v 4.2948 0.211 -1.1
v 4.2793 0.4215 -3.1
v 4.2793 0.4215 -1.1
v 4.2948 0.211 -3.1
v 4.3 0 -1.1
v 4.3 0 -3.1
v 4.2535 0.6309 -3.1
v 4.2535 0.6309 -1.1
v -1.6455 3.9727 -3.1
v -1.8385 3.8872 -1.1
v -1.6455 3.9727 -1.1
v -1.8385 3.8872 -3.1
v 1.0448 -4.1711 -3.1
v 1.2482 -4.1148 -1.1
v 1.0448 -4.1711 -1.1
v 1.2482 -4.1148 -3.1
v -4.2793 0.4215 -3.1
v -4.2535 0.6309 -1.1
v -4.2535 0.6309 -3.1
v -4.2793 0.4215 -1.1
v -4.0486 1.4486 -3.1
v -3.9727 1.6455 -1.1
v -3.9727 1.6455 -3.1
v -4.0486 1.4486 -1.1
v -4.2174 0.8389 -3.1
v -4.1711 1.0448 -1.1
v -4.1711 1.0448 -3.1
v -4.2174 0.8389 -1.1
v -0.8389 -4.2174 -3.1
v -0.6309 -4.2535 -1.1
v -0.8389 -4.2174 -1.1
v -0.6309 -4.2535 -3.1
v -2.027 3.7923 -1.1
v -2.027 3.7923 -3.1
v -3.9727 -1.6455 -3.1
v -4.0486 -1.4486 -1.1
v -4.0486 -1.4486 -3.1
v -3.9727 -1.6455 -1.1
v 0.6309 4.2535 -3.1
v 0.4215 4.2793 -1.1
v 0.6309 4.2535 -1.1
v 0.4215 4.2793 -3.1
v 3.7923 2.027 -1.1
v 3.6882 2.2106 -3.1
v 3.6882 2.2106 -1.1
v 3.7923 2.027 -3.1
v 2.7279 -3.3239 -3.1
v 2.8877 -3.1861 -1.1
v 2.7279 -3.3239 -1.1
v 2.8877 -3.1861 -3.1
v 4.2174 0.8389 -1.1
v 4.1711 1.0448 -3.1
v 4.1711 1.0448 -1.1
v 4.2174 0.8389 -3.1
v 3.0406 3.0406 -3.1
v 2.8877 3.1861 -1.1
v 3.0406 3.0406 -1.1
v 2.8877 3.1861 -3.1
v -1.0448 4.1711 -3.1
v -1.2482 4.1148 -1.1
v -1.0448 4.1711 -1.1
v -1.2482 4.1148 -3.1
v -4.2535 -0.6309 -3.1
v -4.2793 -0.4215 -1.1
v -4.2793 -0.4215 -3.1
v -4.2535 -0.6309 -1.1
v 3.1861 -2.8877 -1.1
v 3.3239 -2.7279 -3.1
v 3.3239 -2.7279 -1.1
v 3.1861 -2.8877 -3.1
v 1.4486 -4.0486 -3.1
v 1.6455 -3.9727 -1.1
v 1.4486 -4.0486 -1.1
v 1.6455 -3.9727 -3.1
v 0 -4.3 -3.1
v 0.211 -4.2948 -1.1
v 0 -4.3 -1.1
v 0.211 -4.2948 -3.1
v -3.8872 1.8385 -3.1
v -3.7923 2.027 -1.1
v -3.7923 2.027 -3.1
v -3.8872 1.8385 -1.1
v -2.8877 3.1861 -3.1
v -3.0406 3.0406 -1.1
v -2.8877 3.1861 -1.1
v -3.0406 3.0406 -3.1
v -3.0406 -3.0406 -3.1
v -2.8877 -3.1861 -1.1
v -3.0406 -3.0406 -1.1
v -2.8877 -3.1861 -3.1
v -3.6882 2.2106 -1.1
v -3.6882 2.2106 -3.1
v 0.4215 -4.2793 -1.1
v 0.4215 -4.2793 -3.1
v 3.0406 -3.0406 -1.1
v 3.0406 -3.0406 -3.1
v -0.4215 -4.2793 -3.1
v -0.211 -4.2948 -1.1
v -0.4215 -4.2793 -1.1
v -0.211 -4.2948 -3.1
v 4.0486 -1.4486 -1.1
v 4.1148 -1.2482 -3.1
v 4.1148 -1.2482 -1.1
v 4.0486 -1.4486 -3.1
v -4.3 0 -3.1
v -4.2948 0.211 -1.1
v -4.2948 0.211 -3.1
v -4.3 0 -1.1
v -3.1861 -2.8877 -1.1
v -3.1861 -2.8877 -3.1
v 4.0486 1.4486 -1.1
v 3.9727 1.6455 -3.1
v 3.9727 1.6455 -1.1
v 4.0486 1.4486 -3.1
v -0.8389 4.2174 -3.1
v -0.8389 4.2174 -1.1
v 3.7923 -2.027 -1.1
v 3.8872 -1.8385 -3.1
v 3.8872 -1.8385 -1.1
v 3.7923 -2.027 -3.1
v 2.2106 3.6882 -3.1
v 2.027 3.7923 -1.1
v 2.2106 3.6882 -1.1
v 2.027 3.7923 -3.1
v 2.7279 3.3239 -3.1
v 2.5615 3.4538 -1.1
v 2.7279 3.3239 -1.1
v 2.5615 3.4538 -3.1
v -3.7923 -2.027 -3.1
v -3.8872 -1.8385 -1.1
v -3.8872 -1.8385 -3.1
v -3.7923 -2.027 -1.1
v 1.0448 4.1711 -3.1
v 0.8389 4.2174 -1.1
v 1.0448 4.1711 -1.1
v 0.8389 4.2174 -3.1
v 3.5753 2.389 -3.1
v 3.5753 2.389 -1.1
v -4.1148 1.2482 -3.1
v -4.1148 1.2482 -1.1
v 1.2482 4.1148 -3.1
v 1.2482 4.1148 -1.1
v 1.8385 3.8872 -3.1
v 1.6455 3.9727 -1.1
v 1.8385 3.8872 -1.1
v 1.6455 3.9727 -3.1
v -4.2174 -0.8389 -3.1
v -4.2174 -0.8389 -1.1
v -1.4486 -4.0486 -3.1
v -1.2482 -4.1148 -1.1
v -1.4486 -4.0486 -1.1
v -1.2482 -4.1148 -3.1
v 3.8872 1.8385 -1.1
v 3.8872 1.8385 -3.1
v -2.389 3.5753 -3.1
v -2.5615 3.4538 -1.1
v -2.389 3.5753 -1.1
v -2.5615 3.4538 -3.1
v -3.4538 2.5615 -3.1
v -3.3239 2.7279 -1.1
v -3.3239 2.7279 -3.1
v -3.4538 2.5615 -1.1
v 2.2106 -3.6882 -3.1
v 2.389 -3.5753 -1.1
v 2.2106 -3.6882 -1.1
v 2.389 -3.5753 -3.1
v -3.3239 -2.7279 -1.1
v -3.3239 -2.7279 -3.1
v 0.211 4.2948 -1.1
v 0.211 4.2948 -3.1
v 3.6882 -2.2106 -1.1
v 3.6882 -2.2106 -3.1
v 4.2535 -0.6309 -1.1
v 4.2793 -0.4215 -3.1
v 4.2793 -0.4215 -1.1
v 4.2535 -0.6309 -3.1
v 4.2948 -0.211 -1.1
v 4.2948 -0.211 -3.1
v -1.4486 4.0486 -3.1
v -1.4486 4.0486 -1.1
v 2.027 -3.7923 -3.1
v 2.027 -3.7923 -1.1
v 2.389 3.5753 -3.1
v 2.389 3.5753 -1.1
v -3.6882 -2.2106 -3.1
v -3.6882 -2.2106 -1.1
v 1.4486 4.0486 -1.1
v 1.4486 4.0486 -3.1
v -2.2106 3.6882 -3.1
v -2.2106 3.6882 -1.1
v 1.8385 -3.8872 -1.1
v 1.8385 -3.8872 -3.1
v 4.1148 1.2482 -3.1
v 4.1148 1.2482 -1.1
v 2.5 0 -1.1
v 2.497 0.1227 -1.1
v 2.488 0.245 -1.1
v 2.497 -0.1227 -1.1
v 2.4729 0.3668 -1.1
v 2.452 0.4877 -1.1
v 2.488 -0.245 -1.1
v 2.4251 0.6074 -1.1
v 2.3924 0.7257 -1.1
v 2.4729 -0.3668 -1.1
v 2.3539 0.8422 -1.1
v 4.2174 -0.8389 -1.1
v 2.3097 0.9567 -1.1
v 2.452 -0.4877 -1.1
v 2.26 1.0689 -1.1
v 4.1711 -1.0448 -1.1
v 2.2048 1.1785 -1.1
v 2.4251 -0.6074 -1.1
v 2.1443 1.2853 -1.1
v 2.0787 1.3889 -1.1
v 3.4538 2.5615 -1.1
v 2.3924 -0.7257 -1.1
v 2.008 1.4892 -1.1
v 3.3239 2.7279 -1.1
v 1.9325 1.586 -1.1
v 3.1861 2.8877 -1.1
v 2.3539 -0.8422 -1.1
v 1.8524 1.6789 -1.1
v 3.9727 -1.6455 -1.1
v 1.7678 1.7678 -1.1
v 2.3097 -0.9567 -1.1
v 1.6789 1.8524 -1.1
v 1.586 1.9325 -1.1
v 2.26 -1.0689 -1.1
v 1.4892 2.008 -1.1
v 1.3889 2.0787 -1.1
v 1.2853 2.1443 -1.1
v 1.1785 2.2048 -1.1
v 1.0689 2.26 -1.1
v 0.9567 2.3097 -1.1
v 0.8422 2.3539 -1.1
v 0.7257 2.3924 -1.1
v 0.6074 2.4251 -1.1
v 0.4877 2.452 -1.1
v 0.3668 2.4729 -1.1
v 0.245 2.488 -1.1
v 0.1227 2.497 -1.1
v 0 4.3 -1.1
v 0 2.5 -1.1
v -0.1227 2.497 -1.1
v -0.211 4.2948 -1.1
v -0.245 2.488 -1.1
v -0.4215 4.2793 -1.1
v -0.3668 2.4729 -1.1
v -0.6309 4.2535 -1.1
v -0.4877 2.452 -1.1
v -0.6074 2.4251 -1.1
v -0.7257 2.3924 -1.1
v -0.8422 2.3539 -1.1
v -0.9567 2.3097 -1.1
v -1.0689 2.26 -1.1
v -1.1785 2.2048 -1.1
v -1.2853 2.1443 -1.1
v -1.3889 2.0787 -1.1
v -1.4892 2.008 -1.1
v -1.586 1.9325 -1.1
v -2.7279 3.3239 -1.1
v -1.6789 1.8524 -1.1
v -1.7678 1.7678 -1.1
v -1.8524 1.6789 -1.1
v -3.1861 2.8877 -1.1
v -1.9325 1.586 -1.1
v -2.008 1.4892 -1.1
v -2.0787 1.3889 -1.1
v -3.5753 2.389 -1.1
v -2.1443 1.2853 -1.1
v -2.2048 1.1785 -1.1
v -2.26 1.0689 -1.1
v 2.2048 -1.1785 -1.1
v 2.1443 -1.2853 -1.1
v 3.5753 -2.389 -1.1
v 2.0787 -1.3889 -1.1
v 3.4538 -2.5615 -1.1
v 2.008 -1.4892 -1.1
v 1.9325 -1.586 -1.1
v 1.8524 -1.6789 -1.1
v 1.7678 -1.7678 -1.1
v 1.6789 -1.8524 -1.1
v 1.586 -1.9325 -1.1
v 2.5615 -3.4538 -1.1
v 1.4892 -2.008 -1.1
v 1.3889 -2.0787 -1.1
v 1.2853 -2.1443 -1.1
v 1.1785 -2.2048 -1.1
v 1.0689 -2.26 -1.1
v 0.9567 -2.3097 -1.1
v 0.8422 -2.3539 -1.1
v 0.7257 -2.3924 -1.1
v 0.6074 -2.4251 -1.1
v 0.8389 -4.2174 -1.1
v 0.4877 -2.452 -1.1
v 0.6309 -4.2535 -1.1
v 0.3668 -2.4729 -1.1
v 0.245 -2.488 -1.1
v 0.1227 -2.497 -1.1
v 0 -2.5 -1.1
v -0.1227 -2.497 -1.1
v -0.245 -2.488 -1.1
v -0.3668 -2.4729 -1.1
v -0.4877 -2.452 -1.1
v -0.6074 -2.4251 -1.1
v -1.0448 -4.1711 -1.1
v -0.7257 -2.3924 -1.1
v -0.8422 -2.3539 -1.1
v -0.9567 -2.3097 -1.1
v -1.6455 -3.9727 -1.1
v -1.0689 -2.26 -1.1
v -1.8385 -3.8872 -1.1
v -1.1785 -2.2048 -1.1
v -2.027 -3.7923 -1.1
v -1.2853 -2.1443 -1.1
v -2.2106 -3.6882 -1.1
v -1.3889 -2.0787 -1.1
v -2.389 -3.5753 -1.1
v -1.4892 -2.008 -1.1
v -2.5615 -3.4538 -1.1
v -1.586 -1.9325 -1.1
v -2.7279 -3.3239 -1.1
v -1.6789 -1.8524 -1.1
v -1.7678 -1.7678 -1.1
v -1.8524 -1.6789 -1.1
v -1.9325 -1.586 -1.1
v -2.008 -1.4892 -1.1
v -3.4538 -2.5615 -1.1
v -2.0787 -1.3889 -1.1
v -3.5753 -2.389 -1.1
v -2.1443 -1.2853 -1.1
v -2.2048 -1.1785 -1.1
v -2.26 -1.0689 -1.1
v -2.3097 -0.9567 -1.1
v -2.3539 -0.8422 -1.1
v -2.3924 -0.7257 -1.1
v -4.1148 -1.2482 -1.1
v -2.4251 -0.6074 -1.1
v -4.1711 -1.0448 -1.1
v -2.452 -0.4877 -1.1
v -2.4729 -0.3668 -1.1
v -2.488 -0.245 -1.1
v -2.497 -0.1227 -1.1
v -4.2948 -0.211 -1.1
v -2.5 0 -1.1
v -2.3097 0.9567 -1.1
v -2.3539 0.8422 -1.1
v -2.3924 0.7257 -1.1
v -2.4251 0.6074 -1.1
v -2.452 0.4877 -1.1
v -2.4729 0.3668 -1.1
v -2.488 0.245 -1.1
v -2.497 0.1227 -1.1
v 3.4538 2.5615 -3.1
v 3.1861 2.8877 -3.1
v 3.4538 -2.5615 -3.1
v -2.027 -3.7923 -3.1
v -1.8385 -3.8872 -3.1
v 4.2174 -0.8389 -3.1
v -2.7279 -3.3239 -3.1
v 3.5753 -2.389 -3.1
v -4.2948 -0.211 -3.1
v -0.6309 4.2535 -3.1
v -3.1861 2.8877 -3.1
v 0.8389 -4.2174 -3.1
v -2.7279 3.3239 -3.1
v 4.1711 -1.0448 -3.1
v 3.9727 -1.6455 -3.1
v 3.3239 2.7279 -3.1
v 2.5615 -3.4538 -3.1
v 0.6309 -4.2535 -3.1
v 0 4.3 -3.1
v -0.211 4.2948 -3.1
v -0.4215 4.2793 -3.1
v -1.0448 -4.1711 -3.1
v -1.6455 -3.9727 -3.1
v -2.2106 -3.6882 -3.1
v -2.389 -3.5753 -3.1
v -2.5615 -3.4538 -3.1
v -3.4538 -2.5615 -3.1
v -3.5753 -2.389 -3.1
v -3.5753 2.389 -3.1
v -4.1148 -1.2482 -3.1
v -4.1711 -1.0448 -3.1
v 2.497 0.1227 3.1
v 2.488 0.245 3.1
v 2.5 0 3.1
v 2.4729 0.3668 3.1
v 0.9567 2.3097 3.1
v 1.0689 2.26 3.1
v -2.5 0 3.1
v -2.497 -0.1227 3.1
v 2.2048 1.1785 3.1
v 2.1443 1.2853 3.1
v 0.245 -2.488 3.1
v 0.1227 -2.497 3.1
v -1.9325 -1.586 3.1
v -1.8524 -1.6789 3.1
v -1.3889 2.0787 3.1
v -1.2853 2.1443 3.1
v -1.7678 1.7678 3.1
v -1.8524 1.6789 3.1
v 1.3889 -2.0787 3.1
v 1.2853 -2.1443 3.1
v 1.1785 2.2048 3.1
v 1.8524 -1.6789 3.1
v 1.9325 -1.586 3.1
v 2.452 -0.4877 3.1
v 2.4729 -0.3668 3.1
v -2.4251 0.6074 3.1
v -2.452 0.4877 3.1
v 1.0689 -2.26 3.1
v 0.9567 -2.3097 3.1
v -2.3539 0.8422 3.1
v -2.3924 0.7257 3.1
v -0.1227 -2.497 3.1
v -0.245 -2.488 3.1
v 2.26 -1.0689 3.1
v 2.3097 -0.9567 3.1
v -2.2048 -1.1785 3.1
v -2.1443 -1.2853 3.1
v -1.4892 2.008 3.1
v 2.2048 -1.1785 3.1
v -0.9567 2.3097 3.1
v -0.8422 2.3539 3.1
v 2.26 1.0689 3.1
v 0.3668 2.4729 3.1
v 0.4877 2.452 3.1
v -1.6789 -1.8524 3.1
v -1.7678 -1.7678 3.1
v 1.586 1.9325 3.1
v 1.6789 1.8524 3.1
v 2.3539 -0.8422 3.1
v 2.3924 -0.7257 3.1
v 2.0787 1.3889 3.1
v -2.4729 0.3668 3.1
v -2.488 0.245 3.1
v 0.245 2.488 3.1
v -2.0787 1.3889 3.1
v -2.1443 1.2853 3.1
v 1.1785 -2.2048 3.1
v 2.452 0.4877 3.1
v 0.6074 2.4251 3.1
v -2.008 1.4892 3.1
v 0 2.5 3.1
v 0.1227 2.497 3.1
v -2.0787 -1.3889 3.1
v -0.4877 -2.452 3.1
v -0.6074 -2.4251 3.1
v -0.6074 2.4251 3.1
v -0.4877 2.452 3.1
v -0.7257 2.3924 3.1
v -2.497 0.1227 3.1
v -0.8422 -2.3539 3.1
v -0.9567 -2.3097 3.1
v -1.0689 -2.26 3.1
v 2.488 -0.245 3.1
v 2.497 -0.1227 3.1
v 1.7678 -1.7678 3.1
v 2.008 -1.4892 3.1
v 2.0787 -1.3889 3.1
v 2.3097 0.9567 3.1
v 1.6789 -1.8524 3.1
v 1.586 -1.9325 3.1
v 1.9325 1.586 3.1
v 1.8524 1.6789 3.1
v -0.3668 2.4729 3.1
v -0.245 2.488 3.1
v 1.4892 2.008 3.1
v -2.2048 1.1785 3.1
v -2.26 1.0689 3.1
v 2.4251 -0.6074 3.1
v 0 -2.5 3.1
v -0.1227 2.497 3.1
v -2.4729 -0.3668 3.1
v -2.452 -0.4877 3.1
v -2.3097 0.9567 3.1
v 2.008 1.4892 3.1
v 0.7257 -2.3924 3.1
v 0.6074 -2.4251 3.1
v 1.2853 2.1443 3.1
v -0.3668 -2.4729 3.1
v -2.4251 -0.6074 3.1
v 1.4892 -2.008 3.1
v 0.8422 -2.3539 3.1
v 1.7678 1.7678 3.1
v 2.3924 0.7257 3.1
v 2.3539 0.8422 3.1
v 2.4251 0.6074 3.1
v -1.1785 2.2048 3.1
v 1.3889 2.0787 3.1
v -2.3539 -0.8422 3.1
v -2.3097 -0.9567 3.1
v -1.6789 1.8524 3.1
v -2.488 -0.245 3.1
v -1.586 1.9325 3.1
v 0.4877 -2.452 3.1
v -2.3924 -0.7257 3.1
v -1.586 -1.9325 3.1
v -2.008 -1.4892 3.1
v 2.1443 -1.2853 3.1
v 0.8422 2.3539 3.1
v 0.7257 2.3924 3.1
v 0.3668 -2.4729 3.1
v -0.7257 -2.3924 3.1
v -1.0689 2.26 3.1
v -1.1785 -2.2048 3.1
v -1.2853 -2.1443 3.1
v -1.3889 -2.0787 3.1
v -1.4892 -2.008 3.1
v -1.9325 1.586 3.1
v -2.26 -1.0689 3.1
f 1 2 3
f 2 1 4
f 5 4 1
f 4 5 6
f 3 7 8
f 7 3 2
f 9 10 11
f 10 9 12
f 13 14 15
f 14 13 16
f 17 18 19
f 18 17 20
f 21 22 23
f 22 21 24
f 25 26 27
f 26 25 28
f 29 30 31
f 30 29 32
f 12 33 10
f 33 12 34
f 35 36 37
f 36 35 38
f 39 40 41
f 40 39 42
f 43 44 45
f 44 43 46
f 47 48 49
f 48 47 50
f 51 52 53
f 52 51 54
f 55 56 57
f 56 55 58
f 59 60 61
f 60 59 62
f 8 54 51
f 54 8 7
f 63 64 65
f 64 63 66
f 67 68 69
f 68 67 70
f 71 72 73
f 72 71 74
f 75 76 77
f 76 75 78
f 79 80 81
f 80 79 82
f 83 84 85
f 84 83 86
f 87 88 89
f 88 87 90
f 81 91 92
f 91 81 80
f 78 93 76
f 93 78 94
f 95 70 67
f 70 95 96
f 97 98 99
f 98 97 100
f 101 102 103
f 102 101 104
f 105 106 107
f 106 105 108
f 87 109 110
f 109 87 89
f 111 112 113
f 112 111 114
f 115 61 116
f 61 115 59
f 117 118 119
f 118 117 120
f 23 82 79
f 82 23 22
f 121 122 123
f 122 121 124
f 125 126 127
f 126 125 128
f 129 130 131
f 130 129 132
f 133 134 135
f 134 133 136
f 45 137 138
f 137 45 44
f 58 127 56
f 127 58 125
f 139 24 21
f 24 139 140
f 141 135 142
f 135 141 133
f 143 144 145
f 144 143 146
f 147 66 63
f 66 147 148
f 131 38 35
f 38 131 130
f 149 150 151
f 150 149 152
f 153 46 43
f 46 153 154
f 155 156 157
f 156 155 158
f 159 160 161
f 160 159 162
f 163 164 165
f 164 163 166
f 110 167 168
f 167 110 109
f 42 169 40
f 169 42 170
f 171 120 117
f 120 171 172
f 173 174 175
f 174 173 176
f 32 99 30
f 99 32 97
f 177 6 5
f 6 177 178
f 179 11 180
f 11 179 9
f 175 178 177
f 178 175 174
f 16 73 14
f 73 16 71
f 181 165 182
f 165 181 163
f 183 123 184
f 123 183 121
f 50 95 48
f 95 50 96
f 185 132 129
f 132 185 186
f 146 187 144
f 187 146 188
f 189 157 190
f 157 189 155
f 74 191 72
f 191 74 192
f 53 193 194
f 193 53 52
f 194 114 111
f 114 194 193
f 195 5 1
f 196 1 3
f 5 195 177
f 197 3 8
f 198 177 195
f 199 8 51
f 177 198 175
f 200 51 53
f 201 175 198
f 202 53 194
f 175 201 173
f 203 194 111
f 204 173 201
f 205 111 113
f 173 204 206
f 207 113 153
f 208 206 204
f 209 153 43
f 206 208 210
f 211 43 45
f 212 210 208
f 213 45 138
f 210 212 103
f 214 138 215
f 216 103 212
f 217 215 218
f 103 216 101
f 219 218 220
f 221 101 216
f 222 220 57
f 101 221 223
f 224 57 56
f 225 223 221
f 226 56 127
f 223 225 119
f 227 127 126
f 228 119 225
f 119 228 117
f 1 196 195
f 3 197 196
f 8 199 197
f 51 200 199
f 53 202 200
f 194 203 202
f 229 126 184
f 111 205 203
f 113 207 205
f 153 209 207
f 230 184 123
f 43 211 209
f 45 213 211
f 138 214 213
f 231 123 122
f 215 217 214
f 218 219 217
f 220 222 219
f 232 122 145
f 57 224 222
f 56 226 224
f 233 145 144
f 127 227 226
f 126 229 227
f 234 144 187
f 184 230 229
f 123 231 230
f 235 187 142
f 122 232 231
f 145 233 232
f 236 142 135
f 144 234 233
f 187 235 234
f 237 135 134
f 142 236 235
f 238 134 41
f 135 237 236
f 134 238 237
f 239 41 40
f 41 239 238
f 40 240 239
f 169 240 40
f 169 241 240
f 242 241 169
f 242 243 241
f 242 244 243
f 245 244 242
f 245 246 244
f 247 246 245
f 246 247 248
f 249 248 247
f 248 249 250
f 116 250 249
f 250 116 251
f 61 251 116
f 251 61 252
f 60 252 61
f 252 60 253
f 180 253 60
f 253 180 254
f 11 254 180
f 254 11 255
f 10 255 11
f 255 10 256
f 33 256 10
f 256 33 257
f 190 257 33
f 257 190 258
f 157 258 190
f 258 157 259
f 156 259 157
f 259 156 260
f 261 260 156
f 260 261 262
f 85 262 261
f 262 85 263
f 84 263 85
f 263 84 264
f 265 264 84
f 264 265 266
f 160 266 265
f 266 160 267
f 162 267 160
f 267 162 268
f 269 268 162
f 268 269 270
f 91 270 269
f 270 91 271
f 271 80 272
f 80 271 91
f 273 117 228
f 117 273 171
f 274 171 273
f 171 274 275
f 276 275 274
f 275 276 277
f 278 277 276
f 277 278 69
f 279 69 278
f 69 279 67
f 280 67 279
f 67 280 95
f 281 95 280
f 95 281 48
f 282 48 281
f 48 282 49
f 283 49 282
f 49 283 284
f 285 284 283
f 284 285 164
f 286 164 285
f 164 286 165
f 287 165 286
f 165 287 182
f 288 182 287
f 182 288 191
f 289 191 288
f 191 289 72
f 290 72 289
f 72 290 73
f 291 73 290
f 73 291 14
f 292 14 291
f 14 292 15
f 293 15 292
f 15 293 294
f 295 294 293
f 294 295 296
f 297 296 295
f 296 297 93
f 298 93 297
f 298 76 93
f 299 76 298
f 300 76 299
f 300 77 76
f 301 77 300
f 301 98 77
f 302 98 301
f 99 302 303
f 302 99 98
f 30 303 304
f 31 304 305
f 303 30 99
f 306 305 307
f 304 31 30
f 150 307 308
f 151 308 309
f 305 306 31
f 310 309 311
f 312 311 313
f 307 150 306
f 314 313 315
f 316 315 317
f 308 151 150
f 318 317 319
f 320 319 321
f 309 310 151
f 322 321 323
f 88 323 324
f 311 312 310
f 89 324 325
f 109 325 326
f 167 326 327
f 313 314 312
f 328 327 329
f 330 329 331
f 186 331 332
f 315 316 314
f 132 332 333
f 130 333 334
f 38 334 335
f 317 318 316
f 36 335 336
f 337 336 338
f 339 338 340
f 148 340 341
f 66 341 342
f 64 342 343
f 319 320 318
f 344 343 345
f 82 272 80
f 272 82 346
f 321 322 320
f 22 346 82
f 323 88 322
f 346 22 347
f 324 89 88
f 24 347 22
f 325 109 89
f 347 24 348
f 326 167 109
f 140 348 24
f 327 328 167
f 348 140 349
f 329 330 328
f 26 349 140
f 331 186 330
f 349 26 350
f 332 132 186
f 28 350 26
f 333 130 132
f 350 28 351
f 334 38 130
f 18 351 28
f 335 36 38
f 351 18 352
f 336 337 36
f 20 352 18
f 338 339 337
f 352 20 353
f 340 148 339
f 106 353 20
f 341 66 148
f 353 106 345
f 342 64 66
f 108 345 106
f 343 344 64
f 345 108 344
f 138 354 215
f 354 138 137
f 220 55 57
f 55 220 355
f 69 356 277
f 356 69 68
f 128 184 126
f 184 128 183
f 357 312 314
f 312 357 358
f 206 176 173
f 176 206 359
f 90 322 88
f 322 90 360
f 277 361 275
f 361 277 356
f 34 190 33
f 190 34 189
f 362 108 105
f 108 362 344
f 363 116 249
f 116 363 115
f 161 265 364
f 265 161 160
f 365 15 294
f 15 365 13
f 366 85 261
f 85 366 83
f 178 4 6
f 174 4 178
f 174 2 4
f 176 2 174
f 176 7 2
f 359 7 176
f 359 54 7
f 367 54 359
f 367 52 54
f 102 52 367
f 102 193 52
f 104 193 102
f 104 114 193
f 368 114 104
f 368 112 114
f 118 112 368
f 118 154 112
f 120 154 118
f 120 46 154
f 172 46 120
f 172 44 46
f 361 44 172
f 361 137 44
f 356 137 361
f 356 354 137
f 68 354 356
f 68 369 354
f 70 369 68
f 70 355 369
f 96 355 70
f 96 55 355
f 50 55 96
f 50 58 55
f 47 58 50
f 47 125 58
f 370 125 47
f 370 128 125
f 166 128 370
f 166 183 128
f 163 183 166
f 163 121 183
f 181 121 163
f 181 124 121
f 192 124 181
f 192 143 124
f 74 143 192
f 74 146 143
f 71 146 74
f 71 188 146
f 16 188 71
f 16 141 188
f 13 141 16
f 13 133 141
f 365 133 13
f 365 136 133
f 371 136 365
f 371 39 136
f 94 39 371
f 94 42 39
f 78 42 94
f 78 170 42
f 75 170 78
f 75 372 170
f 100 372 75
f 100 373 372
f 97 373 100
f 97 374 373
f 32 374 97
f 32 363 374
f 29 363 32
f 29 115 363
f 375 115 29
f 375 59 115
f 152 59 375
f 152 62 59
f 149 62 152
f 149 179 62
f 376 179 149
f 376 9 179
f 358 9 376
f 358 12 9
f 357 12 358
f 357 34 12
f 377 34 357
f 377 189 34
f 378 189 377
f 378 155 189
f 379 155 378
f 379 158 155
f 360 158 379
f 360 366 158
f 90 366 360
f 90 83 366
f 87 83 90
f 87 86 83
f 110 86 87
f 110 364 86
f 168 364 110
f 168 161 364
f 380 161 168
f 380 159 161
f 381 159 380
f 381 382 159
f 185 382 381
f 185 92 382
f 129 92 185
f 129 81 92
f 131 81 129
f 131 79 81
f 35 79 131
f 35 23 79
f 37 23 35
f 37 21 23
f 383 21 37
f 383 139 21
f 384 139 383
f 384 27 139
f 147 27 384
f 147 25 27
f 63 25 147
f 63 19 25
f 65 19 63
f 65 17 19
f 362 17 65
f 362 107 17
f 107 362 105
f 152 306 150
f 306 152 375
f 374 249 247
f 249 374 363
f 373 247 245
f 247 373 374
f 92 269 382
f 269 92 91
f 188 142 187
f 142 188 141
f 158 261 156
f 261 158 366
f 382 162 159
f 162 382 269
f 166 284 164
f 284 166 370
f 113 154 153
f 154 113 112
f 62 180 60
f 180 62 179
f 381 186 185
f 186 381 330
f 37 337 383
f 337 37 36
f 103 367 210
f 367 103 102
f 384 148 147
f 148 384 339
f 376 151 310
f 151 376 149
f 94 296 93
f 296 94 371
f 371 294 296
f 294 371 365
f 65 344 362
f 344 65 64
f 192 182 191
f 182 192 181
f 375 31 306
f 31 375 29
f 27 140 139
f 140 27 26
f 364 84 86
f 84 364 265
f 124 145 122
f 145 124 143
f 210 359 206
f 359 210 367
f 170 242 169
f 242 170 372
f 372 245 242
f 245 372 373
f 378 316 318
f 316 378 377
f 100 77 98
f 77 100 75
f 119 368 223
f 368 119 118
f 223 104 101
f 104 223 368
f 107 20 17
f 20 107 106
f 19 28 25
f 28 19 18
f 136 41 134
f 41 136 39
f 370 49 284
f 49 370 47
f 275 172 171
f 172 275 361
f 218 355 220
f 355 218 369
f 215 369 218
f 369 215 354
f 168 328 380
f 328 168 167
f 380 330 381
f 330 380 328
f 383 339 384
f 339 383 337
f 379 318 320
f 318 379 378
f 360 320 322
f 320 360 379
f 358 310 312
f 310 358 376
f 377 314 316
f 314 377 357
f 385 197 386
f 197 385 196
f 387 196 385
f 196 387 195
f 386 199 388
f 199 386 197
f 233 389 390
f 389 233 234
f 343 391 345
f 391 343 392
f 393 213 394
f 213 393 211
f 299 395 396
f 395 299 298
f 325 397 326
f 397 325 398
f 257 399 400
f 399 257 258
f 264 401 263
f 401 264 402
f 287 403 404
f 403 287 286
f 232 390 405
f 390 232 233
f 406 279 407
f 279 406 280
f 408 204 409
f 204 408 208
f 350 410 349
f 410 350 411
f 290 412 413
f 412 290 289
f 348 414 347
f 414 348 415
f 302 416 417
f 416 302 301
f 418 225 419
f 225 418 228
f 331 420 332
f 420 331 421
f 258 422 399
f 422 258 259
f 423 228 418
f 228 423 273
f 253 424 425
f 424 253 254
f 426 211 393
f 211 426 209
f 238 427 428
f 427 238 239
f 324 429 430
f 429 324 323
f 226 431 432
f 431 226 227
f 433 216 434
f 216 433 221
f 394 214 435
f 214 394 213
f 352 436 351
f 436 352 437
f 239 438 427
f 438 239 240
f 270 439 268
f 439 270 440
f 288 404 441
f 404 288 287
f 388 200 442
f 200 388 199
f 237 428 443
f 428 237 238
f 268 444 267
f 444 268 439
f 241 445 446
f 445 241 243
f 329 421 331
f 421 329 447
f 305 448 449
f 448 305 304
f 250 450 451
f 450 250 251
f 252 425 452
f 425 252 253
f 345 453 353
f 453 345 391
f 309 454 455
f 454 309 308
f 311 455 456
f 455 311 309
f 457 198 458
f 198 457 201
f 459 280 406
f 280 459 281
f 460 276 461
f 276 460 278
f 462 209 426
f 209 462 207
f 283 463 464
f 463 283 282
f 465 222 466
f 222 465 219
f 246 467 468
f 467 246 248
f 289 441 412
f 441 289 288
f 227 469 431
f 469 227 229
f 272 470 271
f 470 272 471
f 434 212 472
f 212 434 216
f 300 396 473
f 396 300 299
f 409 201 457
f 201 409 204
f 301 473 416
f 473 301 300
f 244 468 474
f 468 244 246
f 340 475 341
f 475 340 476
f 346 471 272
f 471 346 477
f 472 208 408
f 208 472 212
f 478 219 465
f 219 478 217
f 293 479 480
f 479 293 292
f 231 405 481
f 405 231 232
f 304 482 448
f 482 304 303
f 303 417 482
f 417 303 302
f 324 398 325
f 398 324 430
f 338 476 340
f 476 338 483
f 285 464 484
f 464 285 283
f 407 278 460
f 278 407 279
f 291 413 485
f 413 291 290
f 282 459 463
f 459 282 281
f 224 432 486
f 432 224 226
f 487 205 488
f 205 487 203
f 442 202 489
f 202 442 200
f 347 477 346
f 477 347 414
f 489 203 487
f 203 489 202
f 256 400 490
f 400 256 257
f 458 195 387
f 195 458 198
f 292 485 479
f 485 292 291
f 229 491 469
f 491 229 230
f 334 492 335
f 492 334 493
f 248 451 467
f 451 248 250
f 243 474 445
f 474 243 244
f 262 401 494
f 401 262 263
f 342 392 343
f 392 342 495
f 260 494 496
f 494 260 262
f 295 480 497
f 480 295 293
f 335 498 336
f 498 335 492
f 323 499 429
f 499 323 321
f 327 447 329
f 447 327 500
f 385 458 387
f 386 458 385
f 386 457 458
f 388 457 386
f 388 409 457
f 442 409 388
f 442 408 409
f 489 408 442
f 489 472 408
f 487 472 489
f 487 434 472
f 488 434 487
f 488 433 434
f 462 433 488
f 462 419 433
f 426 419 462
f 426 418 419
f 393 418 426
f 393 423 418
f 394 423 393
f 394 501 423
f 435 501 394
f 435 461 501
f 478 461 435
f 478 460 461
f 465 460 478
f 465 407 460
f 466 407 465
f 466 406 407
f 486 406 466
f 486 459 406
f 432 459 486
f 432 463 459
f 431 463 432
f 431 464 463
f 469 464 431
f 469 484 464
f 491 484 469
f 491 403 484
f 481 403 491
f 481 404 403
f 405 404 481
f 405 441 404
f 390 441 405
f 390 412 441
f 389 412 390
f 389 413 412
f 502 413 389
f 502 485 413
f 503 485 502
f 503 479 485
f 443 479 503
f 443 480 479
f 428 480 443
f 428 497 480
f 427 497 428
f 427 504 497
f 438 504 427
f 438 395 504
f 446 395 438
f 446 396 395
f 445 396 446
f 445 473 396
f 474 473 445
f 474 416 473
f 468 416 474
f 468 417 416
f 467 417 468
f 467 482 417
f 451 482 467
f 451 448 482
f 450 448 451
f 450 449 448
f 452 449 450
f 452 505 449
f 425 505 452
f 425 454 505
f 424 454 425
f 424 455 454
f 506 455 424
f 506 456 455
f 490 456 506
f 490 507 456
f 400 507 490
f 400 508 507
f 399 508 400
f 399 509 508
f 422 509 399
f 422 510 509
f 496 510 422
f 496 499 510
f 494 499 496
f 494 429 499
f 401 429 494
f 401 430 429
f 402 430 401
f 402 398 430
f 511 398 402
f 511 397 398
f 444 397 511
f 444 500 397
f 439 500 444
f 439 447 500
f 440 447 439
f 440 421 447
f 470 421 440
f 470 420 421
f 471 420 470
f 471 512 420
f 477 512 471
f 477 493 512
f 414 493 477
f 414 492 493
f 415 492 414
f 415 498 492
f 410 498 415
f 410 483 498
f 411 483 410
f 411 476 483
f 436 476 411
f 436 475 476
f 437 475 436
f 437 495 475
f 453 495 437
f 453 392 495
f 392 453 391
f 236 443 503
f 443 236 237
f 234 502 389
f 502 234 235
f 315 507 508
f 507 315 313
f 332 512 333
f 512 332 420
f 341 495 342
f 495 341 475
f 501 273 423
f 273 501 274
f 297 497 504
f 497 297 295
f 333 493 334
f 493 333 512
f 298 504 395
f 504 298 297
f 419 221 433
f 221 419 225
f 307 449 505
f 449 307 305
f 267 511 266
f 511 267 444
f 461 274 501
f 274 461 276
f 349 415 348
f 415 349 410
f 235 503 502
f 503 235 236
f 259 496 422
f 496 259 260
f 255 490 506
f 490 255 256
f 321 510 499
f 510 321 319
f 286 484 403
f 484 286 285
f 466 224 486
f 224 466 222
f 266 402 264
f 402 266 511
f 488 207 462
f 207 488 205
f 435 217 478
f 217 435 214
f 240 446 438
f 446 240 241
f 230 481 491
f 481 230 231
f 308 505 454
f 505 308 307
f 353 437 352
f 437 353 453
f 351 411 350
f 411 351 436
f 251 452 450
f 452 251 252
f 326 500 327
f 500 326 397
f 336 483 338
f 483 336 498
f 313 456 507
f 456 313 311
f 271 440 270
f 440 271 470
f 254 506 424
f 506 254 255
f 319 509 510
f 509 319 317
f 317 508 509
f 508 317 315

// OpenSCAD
$fn=128;

module flange_boss_part(d_flange=8.6, t_flange=2.0, d_boss=5.0, h_boss=4.2) {
    union() {
        translate([0,0,-(t_flange + h_boss)/2])
            cylinder(d=d_flange, h=t_flange);
        translate([0,0,-(t_flange + h_boss)/2 + t_flange])
            cylinder(d=d_boss, h=h_boss);
    }
}

flange_boss_part();
